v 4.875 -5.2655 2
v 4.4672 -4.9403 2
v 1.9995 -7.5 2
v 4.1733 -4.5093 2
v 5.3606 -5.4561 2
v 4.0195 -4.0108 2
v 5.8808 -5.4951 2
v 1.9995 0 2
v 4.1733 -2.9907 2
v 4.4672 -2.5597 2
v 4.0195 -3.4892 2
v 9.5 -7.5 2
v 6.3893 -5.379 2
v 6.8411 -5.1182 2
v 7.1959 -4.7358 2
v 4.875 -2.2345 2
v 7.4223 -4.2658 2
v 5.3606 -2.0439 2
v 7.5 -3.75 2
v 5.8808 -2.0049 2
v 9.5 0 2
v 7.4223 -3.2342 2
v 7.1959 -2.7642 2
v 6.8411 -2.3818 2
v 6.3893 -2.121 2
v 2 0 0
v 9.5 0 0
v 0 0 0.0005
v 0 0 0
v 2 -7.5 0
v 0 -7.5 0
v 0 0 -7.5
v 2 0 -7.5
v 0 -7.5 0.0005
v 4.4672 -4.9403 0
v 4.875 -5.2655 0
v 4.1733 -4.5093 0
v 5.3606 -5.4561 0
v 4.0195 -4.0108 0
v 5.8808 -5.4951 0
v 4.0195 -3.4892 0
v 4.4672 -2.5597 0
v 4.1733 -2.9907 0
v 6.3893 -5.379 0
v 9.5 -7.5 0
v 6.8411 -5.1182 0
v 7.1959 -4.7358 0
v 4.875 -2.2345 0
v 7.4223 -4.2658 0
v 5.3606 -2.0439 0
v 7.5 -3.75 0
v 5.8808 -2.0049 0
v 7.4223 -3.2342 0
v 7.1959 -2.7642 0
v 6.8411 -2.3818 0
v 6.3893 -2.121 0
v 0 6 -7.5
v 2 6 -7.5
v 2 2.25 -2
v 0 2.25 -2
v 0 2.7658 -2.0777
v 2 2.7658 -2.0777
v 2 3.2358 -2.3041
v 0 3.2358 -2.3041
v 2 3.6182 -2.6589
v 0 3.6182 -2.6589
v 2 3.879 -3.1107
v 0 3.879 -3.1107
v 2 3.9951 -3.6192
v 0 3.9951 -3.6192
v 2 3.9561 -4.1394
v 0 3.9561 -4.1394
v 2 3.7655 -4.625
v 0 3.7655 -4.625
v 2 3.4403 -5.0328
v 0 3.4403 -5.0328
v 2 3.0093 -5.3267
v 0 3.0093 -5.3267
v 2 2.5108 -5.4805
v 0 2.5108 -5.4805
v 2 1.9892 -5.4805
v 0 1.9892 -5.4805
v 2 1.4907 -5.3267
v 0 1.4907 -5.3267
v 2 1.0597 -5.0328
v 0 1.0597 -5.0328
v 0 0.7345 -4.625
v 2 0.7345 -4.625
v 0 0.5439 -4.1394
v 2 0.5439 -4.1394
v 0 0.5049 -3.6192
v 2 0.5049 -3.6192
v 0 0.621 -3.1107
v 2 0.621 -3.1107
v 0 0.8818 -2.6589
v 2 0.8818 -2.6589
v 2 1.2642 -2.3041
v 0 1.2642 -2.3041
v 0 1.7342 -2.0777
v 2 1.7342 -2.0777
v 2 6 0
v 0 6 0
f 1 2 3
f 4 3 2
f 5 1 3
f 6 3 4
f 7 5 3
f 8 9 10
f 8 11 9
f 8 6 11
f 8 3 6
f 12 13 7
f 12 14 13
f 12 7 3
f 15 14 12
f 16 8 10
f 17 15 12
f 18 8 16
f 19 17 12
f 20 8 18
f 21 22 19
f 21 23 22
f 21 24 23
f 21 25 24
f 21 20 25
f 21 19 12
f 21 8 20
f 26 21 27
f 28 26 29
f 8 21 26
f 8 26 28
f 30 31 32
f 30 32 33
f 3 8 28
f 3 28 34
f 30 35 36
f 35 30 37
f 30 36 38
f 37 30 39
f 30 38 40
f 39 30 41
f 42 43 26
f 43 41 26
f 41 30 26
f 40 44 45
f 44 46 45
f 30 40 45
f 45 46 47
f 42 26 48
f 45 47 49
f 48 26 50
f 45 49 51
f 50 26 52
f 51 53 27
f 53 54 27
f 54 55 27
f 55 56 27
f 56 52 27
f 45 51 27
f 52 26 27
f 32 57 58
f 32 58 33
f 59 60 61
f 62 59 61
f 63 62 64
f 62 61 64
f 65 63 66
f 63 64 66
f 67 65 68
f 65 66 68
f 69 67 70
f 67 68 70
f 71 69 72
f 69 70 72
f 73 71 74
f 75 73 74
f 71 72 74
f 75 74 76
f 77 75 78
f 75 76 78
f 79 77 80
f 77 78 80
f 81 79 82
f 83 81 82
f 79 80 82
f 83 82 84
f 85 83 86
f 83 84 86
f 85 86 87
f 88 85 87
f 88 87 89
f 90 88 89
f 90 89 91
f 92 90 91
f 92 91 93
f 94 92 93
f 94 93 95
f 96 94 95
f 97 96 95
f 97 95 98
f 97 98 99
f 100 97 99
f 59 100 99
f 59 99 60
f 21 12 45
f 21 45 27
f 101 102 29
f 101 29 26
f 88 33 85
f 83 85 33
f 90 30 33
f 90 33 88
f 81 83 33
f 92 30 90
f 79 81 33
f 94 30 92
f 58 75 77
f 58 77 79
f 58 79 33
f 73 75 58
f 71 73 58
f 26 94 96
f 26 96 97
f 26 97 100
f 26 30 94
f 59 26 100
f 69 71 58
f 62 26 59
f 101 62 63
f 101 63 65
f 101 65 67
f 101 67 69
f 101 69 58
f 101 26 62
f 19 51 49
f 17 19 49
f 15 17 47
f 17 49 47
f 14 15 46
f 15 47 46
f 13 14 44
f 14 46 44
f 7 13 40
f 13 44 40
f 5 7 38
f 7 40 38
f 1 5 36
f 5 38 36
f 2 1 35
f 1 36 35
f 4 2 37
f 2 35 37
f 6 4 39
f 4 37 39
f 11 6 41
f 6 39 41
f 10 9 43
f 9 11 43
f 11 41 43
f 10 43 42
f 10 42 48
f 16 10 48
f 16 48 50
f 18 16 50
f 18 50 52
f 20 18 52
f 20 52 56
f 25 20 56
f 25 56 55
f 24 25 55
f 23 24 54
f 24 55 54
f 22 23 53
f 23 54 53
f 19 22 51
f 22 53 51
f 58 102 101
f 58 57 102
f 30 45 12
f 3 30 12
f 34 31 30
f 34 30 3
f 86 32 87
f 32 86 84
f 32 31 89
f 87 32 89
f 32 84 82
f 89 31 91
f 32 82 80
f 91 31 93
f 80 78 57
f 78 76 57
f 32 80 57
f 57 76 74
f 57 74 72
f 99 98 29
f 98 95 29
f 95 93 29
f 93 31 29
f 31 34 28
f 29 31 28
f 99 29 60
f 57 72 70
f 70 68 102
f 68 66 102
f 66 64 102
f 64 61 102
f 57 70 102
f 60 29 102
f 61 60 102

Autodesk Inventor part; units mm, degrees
ref_plane "YZ Plane" through (0, 0, 0) normal (1, 0, 0) x (0, 1, 0)
ref_plane "XZ Plane" through (0, 0, 0) normal (0, 1, 0) x (-1, 0, 0)
ref_plane "XY Plane" through (0, 0, 0) normal (0, 0, 1) x (1, 0, 0)
sketch "Boceto2" plane through (0, 0, 0) normal (0, 0, 1) x (1, 0, 0)
  line L0 (0, 0) -> (2, 0)
  line L1 (2, 0) -> (2, -7.5)
  line L2 (2, 0) -> (3, 0)
  line L3 (2.8119, -7.5) -> (0, -7.5)
  line L4 (0, -7.5) -> (0, 0)
  line L5 (3, 0) -> (3, -7.5)
  line L6 (3, -7.5) -> (0, -7.5)
  line L7 (3, 0) -> (6.5, 0)
  line L8 (6.5, 0) -> (8.5, 0)
  line L9 (8.5, 0) -> (8.5, -7.5)
  line L10 (8.5, -7.5) -> (3, -7.5)
  circle A0 centre (5.75, -3.75) radius 1.75
  dimension "d6" = 2
  dimension "d15" = 1
  dimension "d16" = 3.5
  dimension "d17" = 2
  dimension "d18" = 3.5
sketch "Boceto1" plane through (0, 0, 0) normal (1, 0, 0) x (0, 1, 0)
  line L0 (0, 0) -> (0, -2)
  line L1 (0, -2) -> (0, -5.5)
  line L2 (0, -5.5) -> (0, -7.5)
  line L3 (0, -7.5) -> (-2, -7.5)
  line L4 (-2, -7.5) -> (-5.5, -7.5)
  line L5 (0, 0) -> (-5.5, 0)
  line L6 (-5.5, -7.5) -> (-7.5, -7.5)
  line L7 (-7.5, -7.5) -> (-7.5, 0)
  line L8 (-7.5, 0) -> (0, 0)
  dimension "d0" = 2
  dimension "d1" = 3.5
  dimension "d2" = 2
  dimension "d3" = 2
  dimension "d4" = 3.5
  dimension "d5" = 2
extrude "Extrusión2" add sketch "Boceto2" along normal blind 2
chamfer "Chaflán1" distance 2 angle 45 1 edges at (0, -3.75, 2)
sketch "Boceto4" plane through (0, 0, 2) normal (0, 0, 1) x (1, 0, 0)
  line L0 (8.5, -7.5) -> (9.5, -7.5)
  line L1 (9.5, -7.5) -> (9.5, 0)
  line L2 (9.5, 0) -> (8.5, 0)
  line L3 (8.5, -7.5) -> (8.5, 0) projected
  line L4 (8.5, 0) -> (8.5, -7.5)
  point P0 (0, 0)
  dimension "d24" = 1
extrude "Extrusión3" add sketch "Boceto4" against normal blind 2
ref_plane "Plano de trabajo2" through (0, 0, -7.5) normal (0, 1, 0) x (1, 0, 0)
sketch "Boceto5" plane through (0, 0, -7.5) normal (0, 1, 0) x (1, 0, 0)
  line L0 (0, -7.5) -> (2, -9.5) projected
  line L1 (0, -7.5) -> (2, -7.5)
  line L2 (2, -7.5) -> (2, 0) projected
  line L3 (2, -7.5) -> (2, 0)
  line L4 (0, 0) -> (2, 0) projected
  line L5 (2, 0) -> (0, 0)
  line L6 (2, -7.5) -> (2, -9.5)
  line L7 (0, 0) -> (0, -7.5) projected
  line L8 (0, -7.5) -> (0, 0)
extrude "Extrusión4" add sketch "Boceto5" along normal blind 6
extrude "Extrusión5" cut sketch "Boceto1" along normal blind 2
extrude "Extrusión6" add sketch "Boceto1" along normal blind 2
sketch "Boceto6" plane through (0, -7.5, -7.5) normal (-1, 0, 0) x (0, 0, 1)
  line L0 (0, 13.5) -> (7.5, 13.5) projected
  line L1 (3.75, 13.5) -> (3.75, 11.5)
  line L2 (3.75, 11.5) -> (3.75, 8)
  circle A0 centre (3.75, 9.75) radius 1.75
  point P0 (7.5, 7.5)
  dimension "d33" = 3.5
extrude "Extrusión7" cut sketch "Boceto6" against normal blind 29.5
sketch "Boceto7" plane through (0, 6, -7.5) normal (0, 1, 0) x (1, 0, 0)
  line L0 (0, 0) -> (0, -7.5) projected
  line L1 (0, -7.5) -> (2, -7.5)
  line L2 (2, -9.5) -> (2, 0) projected
  line L3 (2, -7.5) -> (2, -9.5)
  line L4 (0, -7.5) -> (2, -9.5) projected
  line L5 (2, -9.5) -> (0, -7.5)
extrude "Extrusión8" cut sketch "Boceto7" against normal blind 6
chamfer "Chaflán2" distance 7.5 angle 45 1 edges at (1, -7.5, -7.5)
properties part number "Caixa control - tirador"
